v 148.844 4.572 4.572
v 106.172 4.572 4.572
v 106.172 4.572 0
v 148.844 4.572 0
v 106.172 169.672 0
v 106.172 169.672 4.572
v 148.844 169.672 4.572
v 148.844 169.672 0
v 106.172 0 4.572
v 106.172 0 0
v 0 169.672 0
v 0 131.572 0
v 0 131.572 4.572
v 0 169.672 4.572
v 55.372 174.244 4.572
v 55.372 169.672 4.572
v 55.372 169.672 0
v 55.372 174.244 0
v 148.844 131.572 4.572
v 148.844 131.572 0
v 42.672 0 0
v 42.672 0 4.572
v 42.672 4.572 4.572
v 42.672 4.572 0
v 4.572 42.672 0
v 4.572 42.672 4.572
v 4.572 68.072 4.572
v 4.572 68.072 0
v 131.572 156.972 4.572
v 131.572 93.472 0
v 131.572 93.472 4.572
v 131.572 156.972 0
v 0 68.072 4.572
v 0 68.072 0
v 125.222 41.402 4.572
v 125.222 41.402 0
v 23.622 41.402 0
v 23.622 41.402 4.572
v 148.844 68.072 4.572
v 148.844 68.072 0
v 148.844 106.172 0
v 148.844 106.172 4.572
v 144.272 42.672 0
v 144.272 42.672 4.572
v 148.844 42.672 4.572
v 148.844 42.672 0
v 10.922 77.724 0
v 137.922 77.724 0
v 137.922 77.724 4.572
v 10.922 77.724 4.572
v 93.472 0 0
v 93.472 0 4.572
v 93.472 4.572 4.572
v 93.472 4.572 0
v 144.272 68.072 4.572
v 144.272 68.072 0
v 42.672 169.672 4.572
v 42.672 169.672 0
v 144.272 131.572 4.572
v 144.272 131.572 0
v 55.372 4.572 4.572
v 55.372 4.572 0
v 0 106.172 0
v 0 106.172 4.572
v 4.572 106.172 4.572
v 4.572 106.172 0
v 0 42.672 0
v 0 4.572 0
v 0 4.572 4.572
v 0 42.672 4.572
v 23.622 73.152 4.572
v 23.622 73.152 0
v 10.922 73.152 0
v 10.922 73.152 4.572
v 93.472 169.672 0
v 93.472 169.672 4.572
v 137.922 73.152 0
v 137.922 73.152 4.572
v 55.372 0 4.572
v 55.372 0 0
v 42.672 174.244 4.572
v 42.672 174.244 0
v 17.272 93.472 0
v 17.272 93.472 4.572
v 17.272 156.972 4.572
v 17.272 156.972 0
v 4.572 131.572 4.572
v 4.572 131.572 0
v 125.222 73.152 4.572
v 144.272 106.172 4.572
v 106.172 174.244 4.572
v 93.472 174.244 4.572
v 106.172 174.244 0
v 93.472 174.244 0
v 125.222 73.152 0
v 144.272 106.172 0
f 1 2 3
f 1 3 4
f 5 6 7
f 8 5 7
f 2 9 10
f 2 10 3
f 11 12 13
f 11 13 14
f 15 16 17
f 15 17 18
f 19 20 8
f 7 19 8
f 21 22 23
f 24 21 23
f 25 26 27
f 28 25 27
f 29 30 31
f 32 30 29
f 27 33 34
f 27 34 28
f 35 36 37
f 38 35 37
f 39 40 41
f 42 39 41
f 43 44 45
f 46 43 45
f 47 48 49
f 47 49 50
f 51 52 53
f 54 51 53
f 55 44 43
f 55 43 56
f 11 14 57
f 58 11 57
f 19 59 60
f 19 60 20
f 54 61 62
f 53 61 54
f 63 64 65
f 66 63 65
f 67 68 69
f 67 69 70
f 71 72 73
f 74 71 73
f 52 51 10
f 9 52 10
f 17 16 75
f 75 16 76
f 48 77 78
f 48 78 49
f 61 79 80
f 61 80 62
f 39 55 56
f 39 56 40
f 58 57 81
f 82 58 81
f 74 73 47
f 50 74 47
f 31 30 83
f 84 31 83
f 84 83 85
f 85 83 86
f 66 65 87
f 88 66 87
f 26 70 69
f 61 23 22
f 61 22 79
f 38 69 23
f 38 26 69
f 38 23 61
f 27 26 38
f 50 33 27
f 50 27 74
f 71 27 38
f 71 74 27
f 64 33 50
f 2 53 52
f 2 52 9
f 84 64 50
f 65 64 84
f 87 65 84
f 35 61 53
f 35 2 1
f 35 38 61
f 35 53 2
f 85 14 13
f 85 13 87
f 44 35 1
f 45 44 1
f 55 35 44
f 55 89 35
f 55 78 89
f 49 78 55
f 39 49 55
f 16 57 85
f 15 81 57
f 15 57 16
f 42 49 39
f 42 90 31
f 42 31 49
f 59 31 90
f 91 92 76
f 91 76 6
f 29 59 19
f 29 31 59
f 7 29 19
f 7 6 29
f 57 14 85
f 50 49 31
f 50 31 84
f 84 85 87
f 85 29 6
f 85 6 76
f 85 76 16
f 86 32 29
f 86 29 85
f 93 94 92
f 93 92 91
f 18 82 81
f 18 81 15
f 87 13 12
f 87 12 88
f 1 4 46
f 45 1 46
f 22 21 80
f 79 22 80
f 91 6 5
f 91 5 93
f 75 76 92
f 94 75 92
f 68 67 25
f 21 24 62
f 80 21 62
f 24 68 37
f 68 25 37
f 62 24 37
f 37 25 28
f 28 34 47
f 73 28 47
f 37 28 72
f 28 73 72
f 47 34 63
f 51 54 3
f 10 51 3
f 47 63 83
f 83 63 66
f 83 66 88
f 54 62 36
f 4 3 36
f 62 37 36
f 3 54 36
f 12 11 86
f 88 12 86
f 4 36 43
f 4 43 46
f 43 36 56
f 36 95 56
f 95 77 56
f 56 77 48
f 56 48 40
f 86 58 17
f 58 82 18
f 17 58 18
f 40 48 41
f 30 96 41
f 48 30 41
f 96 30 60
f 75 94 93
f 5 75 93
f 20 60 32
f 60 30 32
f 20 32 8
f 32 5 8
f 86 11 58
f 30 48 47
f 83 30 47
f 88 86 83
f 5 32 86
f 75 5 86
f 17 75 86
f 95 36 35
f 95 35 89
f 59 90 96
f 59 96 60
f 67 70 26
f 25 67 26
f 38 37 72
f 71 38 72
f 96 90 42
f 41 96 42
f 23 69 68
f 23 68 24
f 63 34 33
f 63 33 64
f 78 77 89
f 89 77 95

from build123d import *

# Parameters (mm, degrees)
SKETCH1_W           = 148.844
SKETCH1_H           = 174.244
BOSS_EXTRUDE1_DEPTH = 4.572
SKETCH2_W           = 42.672
SKETCH2_H           = 4.572
SKETCH2_W_2         = 38.1
CUT_EXTRUDE1_DEPTH  = 45.72
SKETCH3_W           = 4.572
SKETCH3_H           = 25.4
CUT_EXTRUDE2_DEPTH  = 45.72
SKETCH4_W           = 114.3
SKETCH4_H           = 63.5
SKETCH4_W_2         = 101.6
SKETCH4_H_2         = 31.75
CUT_EXTRUDE3_DEPTH  = 4.572
SKETCH5_W           = 127
SKETCH5_H           = 4.572
CUT_EXTRUDE4_DEPTH  = 4.572


with BuildPart() as part:
    # Sketch1 → Boss-Extrude1 (new body)
    with BuildSketch(Plane.XY):
        with Locations((74.422, 87.122)):
            Rectangle(SKETCH1_W, SKETCH1_H)
    extrude(amount=BOSS_EXTRUDE1_DEPTH)

    # Sketch2 → Cut-Extrude1 (cut)
    with BuildSketch(Plane.XY.offset(4.572)):
        with Locations((21.336, 2.286)):
            Rectangle(SKETCH2_W, SKETCH2_H)
        with Locations((74.422, 2.286)):
            Rectangle(SKETCH2_W_2, SKETCH2_H)
        with Locations((127.508, 2.286)):
            Rectangle(SKETCH2_W, SKETCH2_H)
        with Locations((21.336, 171.958)):
            Rectangle(SKETCH2_W, SKETCH2_H)
        with Locations((127.508, 171.958)):
            Rectangle(SKETCH2_W, SKETCH2_H)
        with Locations((74.422, 171.958)):
            Rectangle(SKETCH2_W_2, SKETCH2_H)
    extrude(amount=-CUT_EXTRUDE1_DEPTH, mode=Mode.SUBTRACT)

    # Sketch3 → Cut-Extrude2 (cut)
    with BuildSketch(Plane.XY.offset(4.572)):
        with Locations((146.558, 55.372)):
            Rectangle(SKETCH3_W, SKETCH3_H)
        with Locations((2.286, 55.372)):
            Rectangle(SKETCH3_W, SKETCH3_H)
        with Locations((146.558, 118.872)):
            Rectangle(SKETCH3_W, SKETCH3_H)
        with Locations((2.286, 118.872)):
            Rectangle(SKETCH3_W, SKETCH3_H)
    extrude(amount=-CUT_EXTRUDE2_DEPTH, mode=Mode.SUBTRACT)

    # Sketch4 → Cut-Extrude3 (cut)
    with BuildSketch(Plane(origin=(0, 0, 0), x_dir=(-1, 0, 0), z_dir=(0, 0, -1))):
        with Locations((-74.422, 125.222)):
            Rectangle(SKETCH4_W, SKETCH4_H)
        with Locations((-74.422, 57.277)):
            Rectangle(SKETCH4_W_2, SKETCH4_H_2)
    extrude(amount=-CUT_EXTRUDE3_DEPTH, mode=Mode.SUBTRACT)

    # Sketch5 → Cut-Extrude4 (cut)
    with BuildSketch(Plane(origin=(0, 0, 0), x_dir=(-1, 0, 0), z_dir=(0, 0, -1))):
        with Locations((-74.422, 75.438)):
            Rectangle(SKETCH5_W, SKETCH5_H)
    extrude(amount=-CUT_EXTRUDE4_DEPTH, mode=Mode.SUBTRACT)


solid = part.part
